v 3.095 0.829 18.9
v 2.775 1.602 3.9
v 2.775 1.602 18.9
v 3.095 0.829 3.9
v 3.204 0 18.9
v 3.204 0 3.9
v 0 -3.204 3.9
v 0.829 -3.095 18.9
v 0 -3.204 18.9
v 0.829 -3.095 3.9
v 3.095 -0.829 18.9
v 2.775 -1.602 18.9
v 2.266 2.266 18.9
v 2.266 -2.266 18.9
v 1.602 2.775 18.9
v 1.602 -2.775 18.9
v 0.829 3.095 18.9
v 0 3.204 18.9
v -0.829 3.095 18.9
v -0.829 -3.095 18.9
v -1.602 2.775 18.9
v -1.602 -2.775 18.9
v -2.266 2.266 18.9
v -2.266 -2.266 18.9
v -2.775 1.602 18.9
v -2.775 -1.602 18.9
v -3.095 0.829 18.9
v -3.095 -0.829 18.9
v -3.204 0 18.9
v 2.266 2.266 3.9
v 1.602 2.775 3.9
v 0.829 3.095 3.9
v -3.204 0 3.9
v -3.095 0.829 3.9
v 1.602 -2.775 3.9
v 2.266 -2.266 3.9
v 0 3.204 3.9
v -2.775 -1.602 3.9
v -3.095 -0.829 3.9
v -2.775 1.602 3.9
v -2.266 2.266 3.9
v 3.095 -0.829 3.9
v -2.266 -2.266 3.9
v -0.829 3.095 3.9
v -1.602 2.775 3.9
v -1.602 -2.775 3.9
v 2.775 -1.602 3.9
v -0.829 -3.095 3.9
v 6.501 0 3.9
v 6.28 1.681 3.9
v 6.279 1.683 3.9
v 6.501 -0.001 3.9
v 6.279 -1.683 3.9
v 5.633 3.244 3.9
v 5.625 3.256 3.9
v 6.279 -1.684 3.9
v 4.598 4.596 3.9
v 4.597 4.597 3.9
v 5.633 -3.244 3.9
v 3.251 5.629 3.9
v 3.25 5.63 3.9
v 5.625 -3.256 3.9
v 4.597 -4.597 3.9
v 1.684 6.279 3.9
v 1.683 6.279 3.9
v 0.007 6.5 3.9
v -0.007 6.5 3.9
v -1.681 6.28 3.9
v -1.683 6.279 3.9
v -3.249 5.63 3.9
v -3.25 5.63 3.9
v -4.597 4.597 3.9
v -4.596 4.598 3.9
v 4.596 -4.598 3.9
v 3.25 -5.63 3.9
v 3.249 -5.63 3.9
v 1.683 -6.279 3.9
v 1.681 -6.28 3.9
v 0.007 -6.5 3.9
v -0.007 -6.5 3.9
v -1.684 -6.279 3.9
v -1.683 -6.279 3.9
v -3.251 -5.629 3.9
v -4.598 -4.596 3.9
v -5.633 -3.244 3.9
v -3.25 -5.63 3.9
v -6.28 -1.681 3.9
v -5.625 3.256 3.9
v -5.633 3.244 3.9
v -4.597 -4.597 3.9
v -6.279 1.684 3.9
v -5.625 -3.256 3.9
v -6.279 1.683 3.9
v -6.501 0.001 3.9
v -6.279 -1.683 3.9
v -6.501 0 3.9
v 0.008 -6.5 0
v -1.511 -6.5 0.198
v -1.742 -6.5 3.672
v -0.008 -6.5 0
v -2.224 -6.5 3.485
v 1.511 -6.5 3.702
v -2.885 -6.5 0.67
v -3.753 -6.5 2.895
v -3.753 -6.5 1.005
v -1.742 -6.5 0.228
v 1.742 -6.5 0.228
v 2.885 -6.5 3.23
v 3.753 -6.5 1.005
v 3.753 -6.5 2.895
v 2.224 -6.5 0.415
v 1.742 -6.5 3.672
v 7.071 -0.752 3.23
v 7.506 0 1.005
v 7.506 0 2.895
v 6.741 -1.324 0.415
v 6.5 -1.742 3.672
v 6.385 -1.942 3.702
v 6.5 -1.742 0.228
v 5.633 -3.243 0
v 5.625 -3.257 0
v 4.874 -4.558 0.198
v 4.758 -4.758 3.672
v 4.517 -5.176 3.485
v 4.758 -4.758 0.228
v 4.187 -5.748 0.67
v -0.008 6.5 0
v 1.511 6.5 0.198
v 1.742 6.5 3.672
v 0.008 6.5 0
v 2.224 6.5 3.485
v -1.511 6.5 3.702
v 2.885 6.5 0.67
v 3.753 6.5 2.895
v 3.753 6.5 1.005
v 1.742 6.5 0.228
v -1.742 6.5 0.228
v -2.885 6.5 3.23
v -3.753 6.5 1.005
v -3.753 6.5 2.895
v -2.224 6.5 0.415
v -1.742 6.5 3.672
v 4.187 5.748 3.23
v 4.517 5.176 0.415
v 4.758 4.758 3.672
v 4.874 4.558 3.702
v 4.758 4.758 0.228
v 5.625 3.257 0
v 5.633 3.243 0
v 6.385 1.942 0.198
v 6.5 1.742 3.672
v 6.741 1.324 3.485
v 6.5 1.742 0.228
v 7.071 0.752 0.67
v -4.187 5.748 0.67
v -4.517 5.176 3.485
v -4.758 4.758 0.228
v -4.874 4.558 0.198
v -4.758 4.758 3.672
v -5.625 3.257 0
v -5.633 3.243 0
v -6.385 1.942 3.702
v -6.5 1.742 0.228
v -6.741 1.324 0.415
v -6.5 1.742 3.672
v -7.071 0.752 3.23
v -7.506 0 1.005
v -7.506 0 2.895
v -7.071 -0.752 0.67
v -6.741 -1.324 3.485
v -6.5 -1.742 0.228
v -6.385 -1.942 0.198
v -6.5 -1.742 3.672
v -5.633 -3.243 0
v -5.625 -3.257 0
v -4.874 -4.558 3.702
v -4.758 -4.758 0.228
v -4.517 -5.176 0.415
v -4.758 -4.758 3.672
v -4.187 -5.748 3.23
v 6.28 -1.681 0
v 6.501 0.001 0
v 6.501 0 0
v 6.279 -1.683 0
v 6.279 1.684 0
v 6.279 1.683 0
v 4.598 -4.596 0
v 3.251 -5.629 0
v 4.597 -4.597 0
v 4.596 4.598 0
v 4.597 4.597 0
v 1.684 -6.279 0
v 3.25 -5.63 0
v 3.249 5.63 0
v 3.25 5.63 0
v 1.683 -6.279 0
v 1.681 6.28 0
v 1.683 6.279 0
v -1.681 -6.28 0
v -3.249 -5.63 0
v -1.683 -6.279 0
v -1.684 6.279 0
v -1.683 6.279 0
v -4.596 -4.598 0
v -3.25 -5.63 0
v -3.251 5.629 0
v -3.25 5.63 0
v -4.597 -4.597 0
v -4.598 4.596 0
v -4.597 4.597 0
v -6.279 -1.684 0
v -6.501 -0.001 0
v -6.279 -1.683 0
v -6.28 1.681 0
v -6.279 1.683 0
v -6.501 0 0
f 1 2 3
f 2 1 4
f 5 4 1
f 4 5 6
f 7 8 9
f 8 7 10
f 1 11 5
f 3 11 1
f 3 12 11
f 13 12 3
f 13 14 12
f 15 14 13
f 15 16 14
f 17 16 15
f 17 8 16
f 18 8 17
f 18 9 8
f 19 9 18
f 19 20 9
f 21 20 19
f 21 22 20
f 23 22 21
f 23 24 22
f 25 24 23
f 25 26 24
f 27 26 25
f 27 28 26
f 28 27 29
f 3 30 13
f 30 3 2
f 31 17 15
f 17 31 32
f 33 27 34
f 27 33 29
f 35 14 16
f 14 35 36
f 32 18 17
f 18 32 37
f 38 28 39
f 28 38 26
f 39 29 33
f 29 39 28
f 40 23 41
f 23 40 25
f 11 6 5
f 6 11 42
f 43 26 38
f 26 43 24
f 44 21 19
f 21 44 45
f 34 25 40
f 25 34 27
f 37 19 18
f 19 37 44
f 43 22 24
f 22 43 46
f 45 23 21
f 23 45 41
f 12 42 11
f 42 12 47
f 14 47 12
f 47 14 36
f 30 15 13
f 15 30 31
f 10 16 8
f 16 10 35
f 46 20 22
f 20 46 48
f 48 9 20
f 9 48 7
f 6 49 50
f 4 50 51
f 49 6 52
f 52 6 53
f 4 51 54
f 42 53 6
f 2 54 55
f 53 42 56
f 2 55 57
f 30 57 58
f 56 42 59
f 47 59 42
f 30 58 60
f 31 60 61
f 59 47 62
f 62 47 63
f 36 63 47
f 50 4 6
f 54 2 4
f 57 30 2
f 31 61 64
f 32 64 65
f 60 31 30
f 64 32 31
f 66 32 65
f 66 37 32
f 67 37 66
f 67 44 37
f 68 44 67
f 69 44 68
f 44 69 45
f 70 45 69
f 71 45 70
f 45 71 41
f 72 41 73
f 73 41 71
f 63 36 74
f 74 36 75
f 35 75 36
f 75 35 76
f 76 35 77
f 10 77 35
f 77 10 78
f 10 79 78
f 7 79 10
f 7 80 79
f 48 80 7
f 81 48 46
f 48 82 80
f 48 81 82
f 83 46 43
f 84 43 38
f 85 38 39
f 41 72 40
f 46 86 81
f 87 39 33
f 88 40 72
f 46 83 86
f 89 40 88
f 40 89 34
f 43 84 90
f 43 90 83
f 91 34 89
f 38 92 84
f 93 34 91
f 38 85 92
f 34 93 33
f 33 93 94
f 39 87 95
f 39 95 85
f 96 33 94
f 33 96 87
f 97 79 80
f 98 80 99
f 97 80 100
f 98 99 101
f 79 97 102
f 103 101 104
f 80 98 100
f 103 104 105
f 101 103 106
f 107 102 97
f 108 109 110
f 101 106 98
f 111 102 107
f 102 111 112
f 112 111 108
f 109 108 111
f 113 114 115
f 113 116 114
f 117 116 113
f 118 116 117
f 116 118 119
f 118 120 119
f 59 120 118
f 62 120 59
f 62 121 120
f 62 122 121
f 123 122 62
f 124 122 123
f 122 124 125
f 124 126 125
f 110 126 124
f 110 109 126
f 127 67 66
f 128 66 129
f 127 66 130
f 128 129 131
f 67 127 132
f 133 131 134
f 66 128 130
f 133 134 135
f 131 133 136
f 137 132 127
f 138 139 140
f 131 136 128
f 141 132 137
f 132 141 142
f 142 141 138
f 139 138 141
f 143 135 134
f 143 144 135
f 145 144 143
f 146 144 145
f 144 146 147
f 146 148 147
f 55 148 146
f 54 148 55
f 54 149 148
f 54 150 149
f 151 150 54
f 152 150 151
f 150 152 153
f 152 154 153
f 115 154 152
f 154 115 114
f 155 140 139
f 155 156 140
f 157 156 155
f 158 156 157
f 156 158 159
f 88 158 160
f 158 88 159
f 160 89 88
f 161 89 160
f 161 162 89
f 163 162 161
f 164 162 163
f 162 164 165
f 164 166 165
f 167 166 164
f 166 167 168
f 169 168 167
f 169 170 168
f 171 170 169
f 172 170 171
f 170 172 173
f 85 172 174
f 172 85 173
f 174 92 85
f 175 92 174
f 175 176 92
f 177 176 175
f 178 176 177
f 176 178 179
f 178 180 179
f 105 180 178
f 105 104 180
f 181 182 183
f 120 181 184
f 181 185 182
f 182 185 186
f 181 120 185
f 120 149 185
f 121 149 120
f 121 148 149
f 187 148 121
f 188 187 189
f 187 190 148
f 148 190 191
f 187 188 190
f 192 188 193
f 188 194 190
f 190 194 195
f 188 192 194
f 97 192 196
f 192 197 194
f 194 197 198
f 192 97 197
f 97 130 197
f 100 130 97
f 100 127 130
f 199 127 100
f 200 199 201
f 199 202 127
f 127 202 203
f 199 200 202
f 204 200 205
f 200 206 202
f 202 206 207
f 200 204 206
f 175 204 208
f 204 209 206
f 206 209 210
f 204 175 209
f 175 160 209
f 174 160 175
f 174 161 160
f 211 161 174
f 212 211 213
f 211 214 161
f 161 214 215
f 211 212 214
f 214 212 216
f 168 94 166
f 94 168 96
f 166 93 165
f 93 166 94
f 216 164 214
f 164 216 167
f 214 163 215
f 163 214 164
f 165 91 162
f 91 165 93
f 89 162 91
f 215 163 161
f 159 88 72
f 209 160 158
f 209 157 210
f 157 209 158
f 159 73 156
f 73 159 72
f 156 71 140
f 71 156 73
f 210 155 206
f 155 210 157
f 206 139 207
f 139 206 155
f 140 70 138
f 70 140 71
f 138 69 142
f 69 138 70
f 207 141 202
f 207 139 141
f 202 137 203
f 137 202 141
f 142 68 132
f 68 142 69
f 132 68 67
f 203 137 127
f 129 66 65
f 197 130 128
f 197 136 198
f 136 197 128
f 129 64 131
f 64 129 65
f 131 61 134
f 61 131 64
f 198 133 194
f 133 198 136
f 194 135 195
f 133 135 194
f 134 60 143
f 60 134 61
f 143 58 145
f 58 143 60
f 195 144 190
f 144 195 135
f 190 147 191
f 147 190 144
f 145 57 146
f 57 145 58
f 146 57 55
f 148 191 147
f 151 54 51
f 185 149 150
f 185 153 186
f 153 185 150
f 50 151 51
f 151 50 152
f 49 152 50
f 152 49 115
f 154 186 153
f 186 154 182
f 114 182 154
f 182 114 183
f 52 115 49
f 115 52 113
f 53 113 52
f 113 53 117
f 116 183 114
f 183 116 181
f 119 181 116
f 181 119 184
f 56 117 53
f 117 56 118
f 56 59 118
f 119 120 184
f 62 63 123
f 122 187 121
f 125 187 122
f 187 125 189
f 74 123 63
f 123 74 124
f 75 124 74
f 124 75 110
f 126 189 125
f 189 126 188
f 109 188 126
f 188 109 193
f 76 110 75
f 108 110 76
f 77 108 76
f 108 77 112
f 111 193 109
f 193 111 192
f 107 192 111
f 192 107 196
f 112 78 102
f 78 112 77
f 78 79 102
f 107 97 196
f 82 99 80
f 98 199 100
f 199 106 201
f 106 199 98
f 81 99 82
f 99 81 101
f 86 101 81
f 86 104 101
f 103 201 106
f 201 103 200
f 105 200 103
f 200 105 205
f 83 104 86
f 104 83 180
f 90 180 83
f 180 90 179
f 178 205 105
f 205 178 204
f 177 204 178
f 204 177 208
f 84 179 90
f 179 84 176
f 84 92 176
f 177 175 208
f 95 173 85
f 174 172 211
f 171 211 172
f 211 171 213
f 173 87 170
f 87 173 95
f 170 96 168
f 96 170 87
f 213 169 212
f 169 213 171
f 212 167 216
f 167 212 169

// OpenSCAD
// Bolt and Nut Generator (Metric)
// Copyright (c) 2023, Michael H. Phillips
// All rights reserved

/* [Global Options] */

// Part Type - Choose the type of part to make.
Part_Type = "Bolt"; // ["Bolt", "Nut", "Washer", "Threaded Rod", "Tap"]
// Metric Size - The metric thread size for the part.
Metric_Size = 8; //[ 2, 2.2, 2.3, 2.5, 2.6, 3, 3.5, 4, 4.5, 5, 5.5, 6, 7, 8, 9, 10, 11, 12, 14, 15, 16, 17, 18, 20, 22, 24, 25, 26, 27, 28, 30, 32, 33, 35, 36, 38, 39, 40, 42, 45, 48, 50, 52, 55, 56, 58, 60, 62, 63, 64, 65, 68, 70, 72, 75, 76, 78, 80, 82, 85, 90, 95, 100]
// Quality - The number of line segments in a circle. Higher values produce a smoother circle but take longer to preview and render.
Quality = 24;
// Tolerance - Thread diameters are a range in the spec. Loose uses the smallest external and largest internal in the spec. Tight uses the middle of the range for both.
Tolerance = "Loose"; // ["Loose", "Tight"]
// External Thread Adjustment - Fine tune external thread radius. Increase to make Threaded Rod, and Bolts bigger and decrease to make them smaller.
External_Thread_Adjustment = 0; // .01
// Internal Thread Adjustment - Fine tune internal thread radius. Increase to make nuts, taps, and washers bigger and decrease to make them smaller.
Internal_Thread_Adjustment = 0; // .01
Left_Hand_Thread = false;
// Bisect - Cut the model in half. Useful for checking hex key or Phillips depth and size for socket and button heads.
Bisect = false;

/* [Bolt Options] */
Thread_Length = 15; // .5
Shoulder_Length = 0; // .5
// Shoulder Diameter - The diameter of the smooth portion. Special values: Negative numbers set the diameter to the thread minimum diameter and zero sets it to the thread maximum diameter.
Shoulder_Diameter = 0; // .5
Head_Type = "Hex"; // ["Hex", "Socket", "Button", "Star"]
// Head Height - Special value: Zero for the default height.
Head_Height = 0; // .5
// Head Width - Special value: Zero for the default width.
Head_Width = 0; // .5
// Head Chamfer - Hex and star heads only.
Head_Chamfer = true;
// Driver Type - For socket and button heads only.
Driver_Type = "Phillips"; // ["Hex", "Phillips"]
Phillips_Size = "Ph2"; // ["Ph0", "Ph1", "Ph2", "Ph3"]
Hex_Key_Size = 5.2; // .01
// Hex Key Depth - Special value: Zero for the default depth.
Hex_Key_Depth = 0; // .5

/* [Nut Options] */
Nut_Type = "Hex"; // ["Hex", "Wing", "Star"]
// Width - Special value: Zero for the default width.
Width = 0; // .5
// Height - Special value: Zero for the default height.
Height = 0; // .5
// Chamfer - Hex and star nuts only.
Chamfer = true;

/* [Washer Options] */
Thickness = 1.0; // .5
// Outside Diameter - Special value: Zero for default O.D.
Outside_Diameter = 0; // .5

/* [Threaded Rod and Tap Options] */
Length = 10; // .5

/* [Star Options] */
// Number of Points - The number of points on the star.
Number_of_Points = 6;
// Inner Radius - The distance from the center to the inner most part of the star. Zero for default.
Inner_Radius = 0; // .1
// Inner Handle Length - Controls the shape of the inner curve. Zero for default.
Inner_Handle_Length = 0; // .1
// Outer Radius - The distance from the center to the outer most part of the star. Zero for default.
Outer_Radius = 0; // .1
// Outer Handle Length - Controls the shape of the outer curve. Zero for default.
Outer_Handle_Length = 0; // .1
// Segments - Number of line segments per curve of the star.
Segments = 12;
module __Customizer_Limit__() {}

difference() {
  if (Part_Type == "Bolt") {
    bolt(Metric_Size, Thread_Length, Shoulder_Length, Shoulder_Diameter, Head_Type, Driver_Type,
         Phillips_Size, Head_Height, Head_Width, Hex_Key_Size, Hex_Key_Depth, Tolerance,
         External_Thread_Adjustment, Left_Hand_Thread, Head_Chamfer, Number_of_Points, Inner_Radius,
         Inner_Handle_Length, Outer_Radius, Outer_Handle_Length, Segments, $fn=Quality);
  } else if (Part_Type == "Nut") {
    nut(Metric_Size, Width, Height, Nut_Type, Tolerance, Internal_Thread_Adjustment,
        Left_Hand_Thread, Chamfer, Number_of_Points, Inner_Radius, Inner_Handle_Length,
        Outer_Radius, Outer_Handle_Length, Segments, $fn=Quality);
  } else if (Part_Type == "Washer") {
    washer(Metric_Size, Thickness, Outside_Diameter, Tolerance, Internal_Thread_Adjustment, $fn=Quality);
  } else if (Part_Type == "Threaded Rod") {
    threaded_rod(Metric_Size, Length, Tolerance, External_Thread_Adjustment, Left_Hand_Thread, $fn=Quality);
  } else if (Part_Type == "Tap") {
    tap(Metric_Size, Length, Tolerance, Internal_Thread_Adjustment, Left_Hand_Thread, $fn=Quality);
  }
  if (Bisect) {
    translate([-100, -200, -0.01])cube(200);
  }
}

module bolt(m_size, thread_length, shoulder_length, shoulder_diameter, head_type, drive_type,
            phillips_size, head_height_, head_width_, key_size, key_depth_, tolerance,
            thread_adjustment, left_hand_thread, chamfer, n_points, inner_radius, inner_handle_length,
            outer_radius, outer_handle_length, segments) {
  head_width = head_width_ == 0 ? hex_head_lookup(m_size) : head_width_;
  head_height = head_type == "Hex" || head_type == "Button" || head_type == "Star" ?
    head_height_ == 0 ? head_width * 0.3 : head_height_:
    head_height_ == 0 ? head_width * 0.5 : head_height_;
  head_radius = head_width / 2;
  key_depth = key_depth_ == 0 ? head_height * 0.70 : key_depth_;
  pitch = pitch_lookup(m_size);

  if (thread_length > 0) {
    translate([0, 0, shoulder_length])difference() {
      translate([0, 0, -pitch + head_height]) {
        threaded_rod(m_size, thread_length + pitch, tolerance, thread_adjustment, left_hand_thread);
      }
      translate([0, 0, -pitch])hexagon(head_width, head_height + pitch);
    }
  }

  if (shoulder_length > 0) {
    if (shoulder_diameter < 0) {
      d = d_min(rod_maj_lookup(m_size, tolerance)+thread_adjustment, pitch_lookup(m_size));
      translate([0, 0, head_height])cylinder(h=shoulder_length, d=d);
    } else if (shoulder_diameter == 0) {
      d = rod_maj_lookup(m_size, tolerance)+thread_adjustment;
      translate([0, 0, head_height])cylinder(h=shoulder_length, d=d);
    } else {
      translate([0, 0, head_height])cylinder(h=shoulder_length, d=shoulder_diameter);
    }
  }

  if (head_type == "Hex") {
    if (chamfer) {
      difference() {
        hexagon(head_width, head_height);
        chamfer_hexagon(head_width, head_height);
      }
    } else {
      hexagon(head_width, head_height);
    }
  } else if (head_type == "Socket") {
    difference() {
      cylinder(h=head_height, d=head_width);
      if (drive_type == "Hex") {
        translate([0, 0, -0.01])hexagon(key_size, key_depth);
      } else if (drive_type == "Phillips") {
        if (phillips_size == "Ph0") {
          ph0();
        } else if (phillips_size == "Ph1") {
          ph1();
        } else if (phillips_size == "Ph2") {
          ph2();
        } else if (phillips_size == "Ph3") {
          ph3();
        }
      }
    }
  } else if (head_type == "Button") {
    key_radius = key_size/2/cos(30);
    flat_radius = drive_type == "Hex" ? key_radius + (head_radius - key_radius)*0.3 :
      phillips_size == "Ph0" ? 1.6 + (head_radius - 1.6)*0.3 :
        phillips_size == "Ph1" ? 2.75 + (head_radius - 2.75)*0.3 :
          phillips_size == "Ph2" ? 3.0 + (head_radius - 3.0)*0.3 : 3.5 + (head_radius - 3.5)*0.3;
    difference() {
      translate([0, 0, head_height])rotate([180, 0, 0])
        rotate_extrude(angle=360)polygon(concat([[0, head_height]],
          quadratic_bezier([flat_radius, head_height], [head_radius, head_height], [head_radius, 0], 12),
          [[0, 0]]));
      if (drive_type == "Hex") {
        translate([0, 0, -0.01])hexagon(key_size, key_depth);
      } else if (drive_type == "Phillips") {
        if (phillips_size == "Ph0") {
          ph0();
        } else if (phillips_size == "Ph1") {
          ph1();
        } else if (phillips_size == "Ph2") {
          ph2();
        } else if (phillips_size == "Ph3") {
          ph3();
        }
      }
    }
  } else if (head_type == "Star") {
    or = outer_radius == 0 ? head_width/cos(30)/2 : outer_radius;
    ir = inner_radius == 0 ? or * 0.75 : inner_radius;
    ohl = outer_handle_length == 0 ? or * 0.2 : outer_handle_length;
    ihl = inner_handle_length == 0 ? or * 0.2 : inner_handle_length;
    bezier_star(n_points = n_points,
    inner_radius = ir,
    inner_handle_length = ihl,
    outer_radius = or,
    outer_handle_length = ohl,
    segments = segments,
    height = head_height,
    chamfer = chamfer);
  }
}

module nut(m_size, width_=0, height_=0, type="Hex", tolerance="Loose", thread_adjustment=0, left_hand_thread=false, chamfer=true,
           n_points=6, inner_radius=0, inner_handle_length=0, outer_radius=0, outer_handle_length=0, segments=12) {
  width = width_ == 0 ? hex_head_lookup(m_size) : width_;
  pitch = pitch_lookup(m_size);
  height = height_ == 0 ? width * 0.3 : height_;

  difference() {
    if (type == "Hex") {
      if (chamfer) {
        difference() {
          hexagon(width, height);
          chamfer_hexagon(width, height);
        }
      } else {
        hexagon(width, height);
      }
    } else if (type == "Star") {
      or = outer_radius == 0 ? width/cos(30)/2 : outer_radius;
      ir = inner_radius == 0 ? or * 0.75 : inner_radius;
      ohl = outer_handle_length == 0 ? or * 0.2 : outer_handle_length;
      ihl = inner_handle_length == 0 ? or * 0.2 : inner_handle_length;
      bezier_star(n_points = n_points,
      inner_radius = ir,
      inner_handle_length = ihl,
      outer_radius = or,
      outer_handle_length = ohl,
      segments = segments,
      height = height,
      chamfer = chamfer);
    } else if (type == "Wing") {
      cylinder(h=height, d=width);
      mirror_copy([1, 0, 0])hull() {
        translate([width/2 + height*0.75, width/12, height*2.75])rotate([90, 0, 0])cylinder(h=width/6, d=height*1.5);
        translate([tap_maj_lookup(m_size, tolerance)/2, -width/12, 0])cube([0.01, width/6, height]);
      }
    }
    translate([0, 0, -pitch]) {
      tap(m_size, height + pitch * 2, tolerance, thread_adjustment, left_hand_thread);
    }
  }
}

module washer(m_size, thickness, od_, tolerance, thread_adjustment) {
  id = tap_maj_lookup(m_size, tolerance) + thread_adjustment;
  pitch = pitch_lookup(m_size);
  od = od_ == 0 ? hex_head_lookup(m_size) : od_;
  difference() {
    cylinder(h=thickness, d=od);
    translate([0, 0, -1])cylinder(h=thickness + 2, d=id);
  }
}

module threaded_rod(m_size, length, tolerance, thread_adjustment, left_hand_thread) {
  dmaj = rod_maj_lookup(m_size, tolerance) + thread_adjustment;
  pitch = pitch_lookup(m_size);

  threaded_cylinder(dmaj, pitch, length, left_hand_thread);
}

module tap(m_size, length, tolerance, thread_adjustment, left_hand_thread) {
  dmaj = tap_maj_lookup(m_size, tolerance) + thread_adjustment;
  pitch = pitch_lookup(m_size);

  difference() {
    translate([ 0, 0, -pitch ]) {
      threaded_cylinder(dmaj, pitch, length + pitch * 2, left_hand_thread);
    }
    translate([ 0, 0, -2 * pitch ]) {
      cylinder(h = 2 * pitch, d = dmaj + 2);
    }
    translate([ 0, 0, length ]) {
      cylinder(h = 2 * pitch, d = dmaj + 2);
    }
  }
}

//------------------------------------------------------------------------------

module threaded_cylinder(dmaj, pitch, length, left_hand_thread) {
  segments = $fn ? $fn : 24;
  dmin = d_min(dmaj, pitch);
  length1 = length - pitch;
  n_steps = floor(length1 / pitch * segments);
  z_step = length1 / n_steps;
  step_angle = 360 / segments;
  n_lower_taper_steps = floor(segments * 90 / 360);
  n_upper_taper_steps = floor(segments * 90 / 360);
  n_non_taper_steps = n_steps - n_lower_taper_steps - n_upper_taper_steps;

  middle_start = n_lower_taper_steps + 1;
  middle_end = n_steps - n_upper_taper_steps;
  upper_taper_start = middle_end + 1;

  thread_profile0 = [ dmin / 2, 0, 3 / 4 * pitch + 1 / 8 * pitch ];
  thread_profile1 = [ dmaj / 2, 0, 7 / 16 * pitch + 1 / 8 * pitch ];
  thread_profile2 = [ dmaj / 2, 0, 5 / 16 * pitch + 1 / 8 * pitch ];
  thread_profile3 = [ dmin / 2, 0, 0 + 1 / 8 * pitch ];

  lerp_profile1 = [ dmin / 2, 0, 7 / 16 * pitch ];
  lerp_profile2 = [ dmin / 2, 0, 5 / 16 * pitch ];

  lerp_start1 = lerp(lerp_profile1, thread_profile1, n_lower_taper_steps, 1);
  lerp_start2 = lerp(lerp_profile2, thread_profile2, n_lower_taper_steps, 1);

  lerp_end1 = lerp(lerp_profile1, thread_profile1, n_upper_taper_steps, 1);
  lerp_end2 = lerp(lerp_profile2, thread_profile2, n_upper_taper_steps, 1);

  lower_taper_points = [for (step = [0:floor(n_lower_taper_steps)]) each
      [[cos(step_angle * step) * (thread_profile0[0]),
        sin(step_angle * step) * (thread_profile0[0]),
        z_step * step + (thread_profile0[2])],
       [cos(step_angle * step) *
            (lerp(lerp_start1, thread_profile1, n_lower_taper_steps, step)) [0],
        sin(step_angle * step) *
            (lerp(lerp_start1, thread_profile1, n_lower_taper_steps, step)) [0],
        z_step * step + (thread_profile1[2])],
       [cos(step_angle * step) *
            (lerp(lerp_start2, thread_profile2, n_lower_taper_steps, step)) [0],
        sin(step_angle * step) *
            (lerp(lerp_start2, thread_profile2, n_lower_taper_steps, step)) [0],
        z_step * step + (thread_profile2[2])],
       [cos(step_angle * step) * (thread_profile3[0]),
        sin(step_angle * step) * (thread_profile3[0]),
        z_step * step + (thread_profile3[2])]]];
  lower_end_face = [[ 0, 1, 2, 3 ]];
  lower_taper_thread_faces = [for (step = [1:n_lower_taper_steps])
          [[step * 4 - 4, step * 4, step * 4 + 1, step * 4 - 3],
           [step * 4 - 3, step * 4 + 1, step * 4 + 2, step * 4 - 2],
           [step * 4 - 2, step * 4 + 2, step * 4 + 3, step * 4 - 1],
           [step * 4, step * 4 - 4, step * 4 - 1, step * 4 + 3]]];
  lower_taper_thread_faces1 = flatten(lower_taper_thread_faces);
  lower_taper_faces = concat(lower_end_face, lower_taper_thread_faces1);

  middle_points = [for (step = [middle_start:middle_end]) each
      [[cos(step_angle * step) * (thread_profile0[0]),
        sin(step_angle * step) * (thread_profile0[0]),
        z_step * step + (thread_profile0[2])],
       [cos(step_angle * step) * (thread_profile1[0]),
        sin(step_angle * step) * (thread_profile1[0]),
        z_step * step + (thread_profile1[2])],
       [cos(step_angle * step) * (thread_profile2[0]),
        sin(step_angle * step) * (thread_profile2[0]),
        z_step * step + (thread_profile2[2])],
       [cos(step_angle * step) * (thread_profile3[0]),
        sin(step_angle * step) * (thread_profile3[0]),
        z_step * step + (thread_profile3[2])],
  ]];
  middle_thread_faces = [for (step = [middle_start:middle_end])
          [[step * 4 - 4, step * 4, step * 4 + 1, step * 4 - 3],
           [step * 4 - 3, step * 4 + 1, step * 4 + 2, step * 4 - 2],
           [step * 4 - 2, step * 4 + 2, step * 4 + 3, step * 4 - 1],
           [step * 4, step * 4 - 4, step * 4 - 1, step * 4 + 3]]];
  middle_faces = flatten(middle_thread_faces);

  upper_taper_points = [for (step = [upper_taper_start:n_steps]) each
      [[cos(step_angle * step) * (thread_profile0[0]),
        sin(step_angle * step) * (thread_profile0[0]),
        z_step * step + (thread_profile0[2])],
       [cos(step_angle * step) *
            (lerp(thread_profile1, lerp_end1, n_upper_taper_steps,
                  step - n_lower_taper_steps - n_non_taper_steps)) [0],
        sin(step_angle * step) *
            (lerp(thread_profile1, lerp_end1, n_upper_taper_steps,
                  step - n_lower_taper_steps - n_non_taper_steps)) [0],
        z_step * step + (thread_profile1[2])],
       [cos(step_angle * step) *
            (lerp(thread_profile2, lerp_end2, n_upper_taper_steps,
                  step - n_lower_taper_steps - n_non_taper_steps)) [0],
        sin(step_angle * step) *
            (lerp(thread_profile2, lerp_end2, n_upper_taper_steps,
                  step - n_lower_taper_steps - n_non_taper_steps)) [0],
        z_step * step + (thread_profile2[2])],
       [cos(step_angle * step) * (thread_profile3[0]),
        sin(step_angle * step) * (thread_profile3[0]),
        z_step * step + (thread_profile3[2])]]];
  upper_taper_thread_faces = [for (step = [upper_taper_start:n_steps])
          [[step * 4 - 4, step * 4, step * 4 + 1, step * 4 - 3],
           [step * 4 - 3, step * 4 + 1, step * 4 + 2, step * 4 - 2],
           [step * 4 - 2, step * 4 + 2, step * 4 + 3, step * 4 - 1],
           [step * 4, step * 4 - 4, step * 4 - 1, step * 4 + 3]]];
  upper_taper_thread_faces1 = flatten(upper_taper_thread_faces);
  end_face = [[n_steps * 4, n_steps * 4 + 3, n_steps * 4 + 2, n_steps * 4 + 1]];
  upper_taper_faces = concat(upper_taper_thread_faces1, end_face);

  points = concat(lower_taper_points, middle_points, upper_taper_points);
  faces = concat(lower_taper_faces, middle_faces, upper_taper_faces);

  if (left_hand_thread) {
    mirror([ 1, 0, 0 ]) {
      union() {
        cylinder(h = length, d = dmin + 0.001, $fn = segments);
        polyhedron(points, faces, convexity = length / pitch + 2);
      }
    }
  } else {
    union() {
      cylinder(h = length, d = dmin + 0.001, $fn = segments);
      polyhedron(points, faces, convexity = length / pitch + 2);
    }
  }
}

module chamfer_hexagon(width, height) {
  radius = width / 2;
  points = [
    [radius, height + 0.001], [radius/cos(30) + height/2 + 1, height + 0.001],
    [radius/cos(30) + height/2 + 1, -0.001], [radius, -0.001], [radius + height/2, height/2]
  ];
  rotate_extrude(angle = 360, convexity = 4) {
    polygon(points);
  }
}

module hexagon(width, height) {
  radius = width / 2 / cos(30);

  cylinder(h = height, r = radius, $fn = 6);
}

module mirror_copy(normal) {
  children();
  mirror(normal)children();
}

module rounded_square(v, r) {
  hull() {
    translate([r, r])circle(r);
    translate([v.x-r, r])circle(r);
    translate([r, v.y-r])circle(r);
    translate([v.x-r, v.y-r])circle(r);
  }
}

module phillet(r1, r2) {
  rotate([0,11,0])rotate([0,0,-45])linear_extrude(r1*4)rounded_square([r1*2, r1*2], r2);
}

module ph(r1, r2, tip_cut) {
  h=r1/tan(30);
  rotate([0,180,45])translate([0,0,-h])difference() {
    cylinder(h = 20, r = r1);
    rotate_extrude(angle=360)polygon([[0, 0], [r1, h], [r1+1, h], [r1+1, -1], [0,-1]]);
    phillet(r1, r2);
    rotate([0,0,90])phillet(r1, r2);
    rotate([0,0,180])phillet(r1, r2);
    rotate([0,0,270])phillet(r1, r2);
    translate([0,0,-r1+tip_cut])cylinder(h=r1, r=r1);
  }
}

module ph0() {
  ph(1.6, 0.25, 0.44);
}

module ph1() {
  ph(2.75, 0.5, 0.66);
}

module ph2() {
  ph(3.0, 0.75, 1.0);
}

module ph3() {
  ph(3.5, 1.25, 2.25);
}

module bezier_star (
  n_points,
  inner_radius,
  inner_handle_length,
  outer_radius,
  outer_handle_length,
  segments,
  height,
  chamfer,
) {
  chamfer_size=0.2*height;
  module cutter() {
    li = translate_list(list_2d_to_3d(bezier_star_pts(n_points,inner_radius-chamfer_size,
         inner_handle_length*(inner_handle_length/(inner_handle_length+chamfer_size)),
         outer_radius-chamfer_size,
         outer_handle_length*(outer_handle_length/(outer_handle_length+chamfer_size)),
         segments)), [0,0,-0.01]);
    lo = translate_list(list_2d_to_3d(bezier_star_pts(n_points,inner_radius+0.1,
         inner_handle_length*((inner_handle_length+0.1)/inner_handle_length),
         outer_radius+0.1,
         outer_handle_length*((outer_handle_length+0.1)/outer_handle_length),
         segments)), [0,0,-0.01]);
    ui = translate_list(list_2d_to_3d(bezier_star_pts(n_points,inner_radius+0.1,
         inner_handle_length*((inner_handle_length+0.1)/inner_handle_length),
         outer_radius+0.1,
         outer_handle_length*((outer_handle_length+0.1)/outer_handle_length),
         segments)), [0,0,chamfer_size]);
    uo = translate_list(list_2d_to_3d(bezier_star_pts(n_points,inner_radius+1,
         inner_handle_length*((inner_handle_length+1)/inner_handle_length),
         outer_radius+1,
         outer_handle_length*((outer_handle_length+1)/outer_handle_length),
         segments)), [0,0,chamfer_size]);
    pts = concat(li,lo,ui,uo);
    faces = [for (i=[0:len(li)-1]) [
                                   [len(li)+i, len(li)+(i+1)%len(li), 3*len(li)+(i+1)%len(li), 3*len(li)+i],
                                   [3*len(li)+i, 3*len(li)+(i+1)%len(li), 2*len(li)+(i+1)%len(li), 2*len(li)+i],
                                   [2*len(li)+i, 2*len(li)+(i+1)%len(li), (i+1)%len(li), i],
                                   [i, (i+1)%len(li), len(li)+(i+1)%len(li), len(li)+i]]
    ];
    polyhedron(pts,flatten(faces),convexity=30);
  }
  if (chamfer) {
    difference() {
      linear_extrude(height, convexity=30)polygon(bezier_star_pts(n_points,inner_radius,inner_handle_length,outer_radius,outer_handle_length,segments),convexity=30);
      cutter();
      translate([0,0,height+0.01])rotate([180,0,0])cutter();
    }
  } else {
    linear_extrude(height, convexity=30)polygon(bezier_star_pts(n_points,inner_radius,inner_handle_length,outer_radius,outer_handle_length,segments));
  }
}

//------------------------------------------------------------------------------
function translate_list(l, v) = [for (i=[0:len(l)-1]) l[i]+v];

function rod_maj_lookup(m, tolerance) = tolerance == "Loose" ? rod_maj_lookup_min(m) : (rod_maj_lookup_min(m) + rod_maj_lookup_max(m))/2;

function tap_maj_lookup(m, tolerance) = tolerance == "Loose" ? tap_maj_lookup_max(m) : (tap_maj_lookup_min(m) + tap_maj_lookup_max(m))/2;

function flatten(l) = [for (a = l) for (b = a) b];

function thread_height(pitch) = sqrt(3) / 2 * pitch;

function d_min(dMaj, pitch) = dMaj - 2 * 5 / 8 * thread_height(pitch);

function lerp(start, end, nSteps, step) = start + ((end - start) / nSteps * step);

function quadratic_bezier(start, control, end, segments) = [for (i = [0:segments], t=i*1/segments)
  start * (1-t)*(1-t) + control*t*(1-t)*2 + end*t*t];

function cubic_bezier(start, control1, control2, end, segments) = [for (i=[0:segments], t=i*1/segments)
            start * (1.0 - t) * (1.0 - t) * (1.0 - t)
                + control1 * t * (1.0 - t) * (1.0 - t) * 3.0
                + control2 * t * t * (1.0 - t) * 3.0
                + end * t * t * t ];

function norm2(v) = [v.x/sqrt(v.x*v.x+v.y*v.y), v.y/sqrt(v.x*v.x+v.y*v.y)];

function reverse_list(l) = [for (i=[0:len(l)-1])l[len(l)-1-i]];

function rotate_cw_2d(p, a) = [p.x*cos(-a)-p.y*sin(-a),p.x*sin(-a)+p.y*cos(-a)];

function list_2d_to_3d(l) = [for (i=[0:len(l)-1]) [l[i].x, l[i].y, 0]];

function bezier_star_pts(
  n_points,
  inner_radius,
  inner_handle_length,
  outer_radius,
  outer_handle_length,
  segments,
) = let (
  a = 360/(n_points),
  a2 = a/2,
  n = n_points,
  ir = inner_radius,
  ihl = inner_handle_length,
  or = outer_radius,
  ohl = outer_handle_length,

  start = [or,0],
  control1 = [or,-ohl],
  end = [cos(a2)*ir, -sin(a2)*ir],
  control2 = end + norm2([or,0] - [cos(a)*or, -sin(a)*or])*ihl,

  first_half = cubic_bezier(start,control1,control2,end,segments),
  reversed = reverse_list(l = first_half),
  second_half1 = [for (a=reversed)[a.x,-a.y]],
  second_half = [ for (i=[0:len(second_half1)-1]) rotate_cw_2d(second_half1[i], a)],

  section_pts = concat(first_half,second_half))

  flatten([for (i=[0:n-1])[for (j=[0:len(section_pts)-1]) rotate_cw_2d(section_pts[j], a*i)]]);

// lookup tables derived from
// http://www.apollointernational.in/iso-metric-thread-chart.php
function pitch_lookup(m) = lookup(m, [
  [ 2,   0.4 ],
  [ 2.2, 0.45 ],
  [ 2.3, 0.45 ],
  [ 2.5, 0.45 ],
  [ 2.6, 0.45 ],
  [ 3,   0.5 ],
  [ 3.5, 0.6 ],
  [ 4,   0.7 ],
  [ 4.5, 0.75 ],
  [ 5,   0.8 ],
  [ 5.5, 0.5 ],
  [ 6,   1 ],
  [ 7,   1 ],
  [ 8,   1.25 ],
  [ 9,   1.25 ],
  [ 10,  1.5 ],
  [ 11,  1.5 ],
  [ 12,  1.75 ],
  [ 14,  2 ],
  [ 15,  1.5 ],
  [ 16,  2 ],
  [ 17,  1.5 ],
  [ 18,  2.5 ],
  [ 20,  2.5 ],
  [ 22,  3 ],
  [ 24,  3 ],
  [ 25,  2 ],
  [ 26,  1.5 ],
  [ 27,  3 ],
  [ 28,  2 ],
  [ 30,  3.5 ],
  [ 32,  2 ],
  [ 33,  3.5 ],
  [ 35,  1.5 ],
  [ 36,  4 ],
  [ 38,  1.5 ],
  [ 39,  4 ],
  [ 40,  3 ],
  [ 42,  4.5 ],
  [ 45,  4.5 ],
  [ 48,  5 ],
  [ 50,  4 ],
  [ 52,  5 ],
  [ 55,  4 ],
  [ 56,  5.5 ],
  [ 58,  4 ],
  [ 60,  5.5 ],
  [ 62,  4 ],
  [ 63,  1.5 ],
  [ 64,  6 ],
  [ 65,  4 ],
  [ 68,  6 ],
  [ 70,  6 ],
  [ 72,  6 ],
  [ 75,  6 ],
  [ 76,  6 ],
  [ 78,  2 ],
  [ 80,  6 ],
  [ 82,  2 ],
  [ 85,  6 ],
  [ 90,  6 ],
  [ 95,  6 ],
  [ 100, 6 ],
]);

// minimum diameter of dMaj range used for threaded rods
function rod_maj_lookup_min(m) = lookup(m, [
  [ 2,   1.886 ],
  [ 2.2, 2.08  ],
  [ 2.3, 2.18  ],
  [ 2.5, 2.38  ],
  [ 2.6, 2.48  ],
  [ 3,   2.874 ],
  [ 3.5, 3.354 ],
  [ 4,   3.838 ],
  [ 4.5, 4.338 ],
  [ 5,   4.826 ],
  [ 5.5, 5.374 ],
  [ 6,   5.794 ],
  [ 7,   6.794 ],
  [ 8,   7.76  ],
  [ 9,   8.76  ],
  [ 10,  9.732 ],
  [ 11,  10.73 ],
  [ 12,  11.7  ],
  [ 14,  13.68 ],
  [ 15,  14.73 ],
  [ 16,  15.68 ],
  [ 17,  16.73 ],
  [ 18,  17.62 ],
  [ 20,  19.62 ],
  [ 22,  21.58 ],
  [ 24,  23.58 ],
  [ 25,  24.68 ],
  [ 26,  25.73 ],
  [ 27,  26.58 ],
  [ 28,  27.68 ],
  [ 30,  29.52 ],
  [ 32,  31.68 ],
  [ 33,  32.54 ],
  [ 35,  34.73 ],
  [ 36,  35.47 ],
  [ 38,  37.73 ],
  [ 39,  38.47 ],
  [ 40,  39.58 ],
  [ 42,  41.44 ],
  [ 45,  44.44 ],
  [ 48,  47.4  ],
  [ 50,  49.47 ],
  [ 52,  51.4, ],
  [ 55,  54.47 ],
  [ 56,  55.37 ],
  [ 58,  57.47 ],
  [ 60,  59.37 ],
  [ 62,  61.47 ],
  [ 63,  62.73 ],
  [ 64,  63.32 ],
  [ 65,  64.47 ],
  [ 68,  67.32 ],
  [ 70,  69.32 ],
  [ 72,  71.32 ],
  [ 75,  74.32 ],
  [ 76,  75.32 ],
  [ 78,  77.68 ],
  [ 80,  79.32 ],
  [ 82,  81.68 ],
  [ 85,  84.32 ],
  [ 90,  89.32 ],
  [ 95,  94.32 ],
  [ 100, 99.32 ],
]);

// maximum diameter of dMaj range used for threaded rods
function rod_maj_lookup_max(m) = lookup(m, [
  [ 2,   1.981 ],
  [ 2.2, 2.18  ],
  [ 2.3, 2.28  ],
  [ 2.5, 2.48  ],
  [ 2.6, 2.58  ],
  [ 3,   2.98  ],
  [ 3.5, 3.479 ],
  [ 4,   3.978 ],
  [ 4.5, 4.478 ],
  [ 5,   4.976 ],
  [ 5.5, 5.48  ],
  [ 6,   5.974 ],
  [ 7,   6.974 ],
  [ 8,   7.972 ],
  [ 9,   8.972 ],
  [ 10,  9.968 ],
  [ 11,  10.97 ],
  [ 12,  11.97 ],
  [ 14,  13.96 ],
  [ 15,  14.97 ],
  [ 16,  15.96 ],
  [ 17,  16.97 ],
  [ 18,  17.96 ],
  [ 20,  19.96 ],
  [ 22,  21.95 ],
  [ 24,  23.95 ],
  [ 25,  24.96 ],
  [ 26,  25.97 ],
  [ 27,  26.95 ],
  [ 28,  27.96 ],
  [ 30,  29.95 ],
  [ 32,  31.96 ],
  [ 33,  32.97 ],
  [ 35,  34.97 ],
  [ 36,  35.94 ],
  [ 38,  37.97 ],
  [ 39,  38.94 ],
  [ 40,  39.95 ],
  [ 42,  41.94 ],
  [ 45,  44.94 ],
  [ 48,  47.93 ],
  [ 50,  49.94 ],
  [ 52,  51.93 ],
  [ 55,  54.94 ],
  [ 56,  55.93 ],
  [ 58,  57.94 ],
  [ 60,  59.93 ],
  [ 62,  61.94 ],
  [ 63,  62.97 ],
  [ 64,  63.92 ],
  [ 65,  64.94 ],
  [ 68,  67.92 ],
  [ 70,  69.92 ],
  [ 72,  71.92 ],
  [ 75,  74.92 ],
  [ 76,  75.92 ],
  [ 78,  77.96 ],
  [ 80,  79.92 ],
  [ 82,  81.96 ],
  [ 85,  84.92 ],
  [ 90,  89.92 ],
  [ 95,  94.92 ],
  [ 100, 99.92 ],
]);

// minimum diameter of dMaj range used for taps
function tap_maj_lookup_min(m) = lookup(m, [
  [ 2,   2   ],
  [ 2.2, 2.2 ],
  [ 2.3, 2.3 ],
  [ 2.5, 2.5 ],
  [ 2.6, 2.6 ],
  [ 3,   3   ],
  [ 3.5, 3.5 ],
  [ 4,   4   ],
  [ 4.5, 4.5 ],
  [ 5,   5   ],
  [ 5.5, 5.5 ],
  [ 6,   6   ],
  [ 7,   7   ],
  [ 8,   8   ],
  [ 9,   9   ],
  [ 10,  10  ],
  [ 11,  11  ],
  [ 12,  12  ],
  [ 14,  14  ],
  [ 15,  15  ],
  [ 16,  16  ],
  [ 17,  17  ],
  [ 18,  18  ],
  [ 20,  20  ],
  [ 22,  22  ],
  [ 24,  24  ],
  [ 25,  25  ],
  [ 26,  26  ],
  [ 27,  27  ],
  [ 28,  28  ],
  [ 30,  30  ],
  [ 32,  32  ],
  [ 33,  33  ],
  [ 35,  35  ],
  [ 36,  36  ],
  [ 38,  38  ],
  [ 39,  39  ],
  [ 40,  40  ],
  [ 42,  42  ],
  [ 45,  45  ],
  [ 48,  48  ],
  [ 50,  50  ],
  [ 52,  52  ],
  [ 55,  55  ],
  [ 56,  56  ],
  [ 58,  58  ],
  [ 60,  60  ],
  [ 62,  62  ],
  [ 63,  63  ],
  [ 64,  64  ],
  [ 65,  65  ],
  [ 68,  68  ],
  [ 70,  70  ],
  [ 72,  72  ],
  [ 75,  75  ],
  [ 76,  76  ],
  [ 78,  78  ],
  [ 80,  80  ],
  [ 82,  82  ],
  [ 85,  85  ],
  [ 90,  90  ],
  [ 95,  95  ],
  [ 100, 100 ],
]);

// maximum diameter of dMaj range used for taps
function tap_maj_lookup_max(m) = lookup(m, [
  [ 2,   2.148  ],
  [ 2.2, 2.36   ],
  [ 2.3, 2.46   ],
  [ 2.5, 2.66   ],
  [ 2.6, 2.75   ],
  [ 3,   3.172  ],
  [ 3.5, 3.699  ],
  [ 4,   4.219  ],
  [ 4.5, 4.726  ],
  [ 5,   5.24   ],
  [ 5.5, 5.692  ],
  [ 6,   6.294  ],
  [ 7,   7.294  ],
  [ 8,   8.34   ],
  [ 9,   9.34   ],
  [ 10,  10.396 ],
  [ 11,  11.387 ],
  [ 12,  12.453 ],
  [ 14,  14.501 ],
  [ 15,  15.407 ],
  [ 16,  16.501 ],
  [ 17,  17.407 ],
  [ 18,  18.585 ],
  [ 20,  20.585 ],
  [ 22,  22.677 ],
  [ 24,  24.698 ],
  [ 25,  25.513 ],
  [ 26,  26.417 ],
  [ 27,  27.698 ],
  [ 28,  28.513 ],
  [ 30,  30.785 ],
  [ 32,  32.513 ],
  [ 33,  33.785 ],
  [ 35,  35.416 ],
  [ 36,  36.877 ],
  [ 38,  38.417 ],
  [ 39,  39.877 ],
  [ 40,  40.698 ],
  [ 42,  42.965 ],
  [ 45,  45.965 ],
  [ 48,  49.057 ],
  [ 50,  50.892 ],
  [ 52,  53.037 ],
  [ 55,  55.892 ],
  [ 56,  57.149 ],
  [ 58,  58.892 ],
  [ 60,  61.149 ],
  [ 62,  62.892 ],
  [ 63,  63.429 ],
  [ 64,  65.421 ],
  [ 65,  65.892 ],
  [ 68,  69.241 ],
  [ 70,  71.241 ],
  [ 72,  73.241 ],
  [ 75,  76.241 ],
  [ 76,  77.241 ],
  [ 78,  78.525 ],
  [ 80,  81.241 ],
  [ 82,  82.525 ],
  [ 85,  86.241 ],
  [ 90,  91.241 ],
  [ 95,  96.266 ],
  [ 100, 101.27 ],
]);

// https://amesweb.info/Fasteners/Nut/Metric-Hex-Nut-Sizes-Dimensions-Chart.aspx
// missing made up by me to match next biggest known
function hex_head_lookup(m) = lookup(m, [
  [ 2,   4 ],
  [ 2.2, 4 ],
  [ 2.3, 4 ],
  [ 2.5, 5 ],
  [ 2.6, 5 ],
  [ 3,   5.5 ],
  [ 3.5, 6 ],
  [ 4,   7 ],
  [ 4.5, 7 ],
  [ 5,   8 ],
  [ 5.5, 8 ],
  [ 6,   10 ],
  [ 7,   12 ],
  [ 8,   13 ],
  [ 9,   14 ],
  [ 10,  16 ],
  [ 11,  16 ],
  [ 12,  18 ],
  [ 14,  21 ],
  [ 15,  22 ],
  [ 16,  24 ],
  [ 17,  24 ],
  [ 18,  27 ],
  [ 20,  30 ],
  [ 22,  34 ],
  [ 24,  36 ],
  [ 25,  40 ],
  [ 26,  40 ],
  [ 27,  41 ],
  [ 28,  46 ],
  [ 30,  46 ],
  [ 32,  50 ],
  [ 33,  50 ],
  [ 35,  55 ],
  [ 36,  55 ],
  [ 38,  60 ],
  [ 39,  60 ],
  [ 40,  65 ],
  [ 42,  65 ],
  [ 45,  70 ],
  [ 48,  75 ],
  [ 50,  80 ],
  [ 52,  80 ],
  [ 55,  85 ],
  [ 56,  85 ],
  [ 58,  90 ],
  [ 60,  90 ],
  [ 62,  95 ],
  [ 63,  95 ],
  [ 64,  95 ],
  [ 65,  100 ],
  [ 68,  100 ],
  [ 70,  100 ],
  [ 72,  110 ],
  [ 75,  110 ],
  [ 76,  110 ],
  [ 78,  120 ],
  [ 80,  120 ],
  [ 82,  120 ],
  [ 85,  130 ],
  [ 90,  130 ],
  [ 95,  130 ],
  [ 100, 140 ],
]);
